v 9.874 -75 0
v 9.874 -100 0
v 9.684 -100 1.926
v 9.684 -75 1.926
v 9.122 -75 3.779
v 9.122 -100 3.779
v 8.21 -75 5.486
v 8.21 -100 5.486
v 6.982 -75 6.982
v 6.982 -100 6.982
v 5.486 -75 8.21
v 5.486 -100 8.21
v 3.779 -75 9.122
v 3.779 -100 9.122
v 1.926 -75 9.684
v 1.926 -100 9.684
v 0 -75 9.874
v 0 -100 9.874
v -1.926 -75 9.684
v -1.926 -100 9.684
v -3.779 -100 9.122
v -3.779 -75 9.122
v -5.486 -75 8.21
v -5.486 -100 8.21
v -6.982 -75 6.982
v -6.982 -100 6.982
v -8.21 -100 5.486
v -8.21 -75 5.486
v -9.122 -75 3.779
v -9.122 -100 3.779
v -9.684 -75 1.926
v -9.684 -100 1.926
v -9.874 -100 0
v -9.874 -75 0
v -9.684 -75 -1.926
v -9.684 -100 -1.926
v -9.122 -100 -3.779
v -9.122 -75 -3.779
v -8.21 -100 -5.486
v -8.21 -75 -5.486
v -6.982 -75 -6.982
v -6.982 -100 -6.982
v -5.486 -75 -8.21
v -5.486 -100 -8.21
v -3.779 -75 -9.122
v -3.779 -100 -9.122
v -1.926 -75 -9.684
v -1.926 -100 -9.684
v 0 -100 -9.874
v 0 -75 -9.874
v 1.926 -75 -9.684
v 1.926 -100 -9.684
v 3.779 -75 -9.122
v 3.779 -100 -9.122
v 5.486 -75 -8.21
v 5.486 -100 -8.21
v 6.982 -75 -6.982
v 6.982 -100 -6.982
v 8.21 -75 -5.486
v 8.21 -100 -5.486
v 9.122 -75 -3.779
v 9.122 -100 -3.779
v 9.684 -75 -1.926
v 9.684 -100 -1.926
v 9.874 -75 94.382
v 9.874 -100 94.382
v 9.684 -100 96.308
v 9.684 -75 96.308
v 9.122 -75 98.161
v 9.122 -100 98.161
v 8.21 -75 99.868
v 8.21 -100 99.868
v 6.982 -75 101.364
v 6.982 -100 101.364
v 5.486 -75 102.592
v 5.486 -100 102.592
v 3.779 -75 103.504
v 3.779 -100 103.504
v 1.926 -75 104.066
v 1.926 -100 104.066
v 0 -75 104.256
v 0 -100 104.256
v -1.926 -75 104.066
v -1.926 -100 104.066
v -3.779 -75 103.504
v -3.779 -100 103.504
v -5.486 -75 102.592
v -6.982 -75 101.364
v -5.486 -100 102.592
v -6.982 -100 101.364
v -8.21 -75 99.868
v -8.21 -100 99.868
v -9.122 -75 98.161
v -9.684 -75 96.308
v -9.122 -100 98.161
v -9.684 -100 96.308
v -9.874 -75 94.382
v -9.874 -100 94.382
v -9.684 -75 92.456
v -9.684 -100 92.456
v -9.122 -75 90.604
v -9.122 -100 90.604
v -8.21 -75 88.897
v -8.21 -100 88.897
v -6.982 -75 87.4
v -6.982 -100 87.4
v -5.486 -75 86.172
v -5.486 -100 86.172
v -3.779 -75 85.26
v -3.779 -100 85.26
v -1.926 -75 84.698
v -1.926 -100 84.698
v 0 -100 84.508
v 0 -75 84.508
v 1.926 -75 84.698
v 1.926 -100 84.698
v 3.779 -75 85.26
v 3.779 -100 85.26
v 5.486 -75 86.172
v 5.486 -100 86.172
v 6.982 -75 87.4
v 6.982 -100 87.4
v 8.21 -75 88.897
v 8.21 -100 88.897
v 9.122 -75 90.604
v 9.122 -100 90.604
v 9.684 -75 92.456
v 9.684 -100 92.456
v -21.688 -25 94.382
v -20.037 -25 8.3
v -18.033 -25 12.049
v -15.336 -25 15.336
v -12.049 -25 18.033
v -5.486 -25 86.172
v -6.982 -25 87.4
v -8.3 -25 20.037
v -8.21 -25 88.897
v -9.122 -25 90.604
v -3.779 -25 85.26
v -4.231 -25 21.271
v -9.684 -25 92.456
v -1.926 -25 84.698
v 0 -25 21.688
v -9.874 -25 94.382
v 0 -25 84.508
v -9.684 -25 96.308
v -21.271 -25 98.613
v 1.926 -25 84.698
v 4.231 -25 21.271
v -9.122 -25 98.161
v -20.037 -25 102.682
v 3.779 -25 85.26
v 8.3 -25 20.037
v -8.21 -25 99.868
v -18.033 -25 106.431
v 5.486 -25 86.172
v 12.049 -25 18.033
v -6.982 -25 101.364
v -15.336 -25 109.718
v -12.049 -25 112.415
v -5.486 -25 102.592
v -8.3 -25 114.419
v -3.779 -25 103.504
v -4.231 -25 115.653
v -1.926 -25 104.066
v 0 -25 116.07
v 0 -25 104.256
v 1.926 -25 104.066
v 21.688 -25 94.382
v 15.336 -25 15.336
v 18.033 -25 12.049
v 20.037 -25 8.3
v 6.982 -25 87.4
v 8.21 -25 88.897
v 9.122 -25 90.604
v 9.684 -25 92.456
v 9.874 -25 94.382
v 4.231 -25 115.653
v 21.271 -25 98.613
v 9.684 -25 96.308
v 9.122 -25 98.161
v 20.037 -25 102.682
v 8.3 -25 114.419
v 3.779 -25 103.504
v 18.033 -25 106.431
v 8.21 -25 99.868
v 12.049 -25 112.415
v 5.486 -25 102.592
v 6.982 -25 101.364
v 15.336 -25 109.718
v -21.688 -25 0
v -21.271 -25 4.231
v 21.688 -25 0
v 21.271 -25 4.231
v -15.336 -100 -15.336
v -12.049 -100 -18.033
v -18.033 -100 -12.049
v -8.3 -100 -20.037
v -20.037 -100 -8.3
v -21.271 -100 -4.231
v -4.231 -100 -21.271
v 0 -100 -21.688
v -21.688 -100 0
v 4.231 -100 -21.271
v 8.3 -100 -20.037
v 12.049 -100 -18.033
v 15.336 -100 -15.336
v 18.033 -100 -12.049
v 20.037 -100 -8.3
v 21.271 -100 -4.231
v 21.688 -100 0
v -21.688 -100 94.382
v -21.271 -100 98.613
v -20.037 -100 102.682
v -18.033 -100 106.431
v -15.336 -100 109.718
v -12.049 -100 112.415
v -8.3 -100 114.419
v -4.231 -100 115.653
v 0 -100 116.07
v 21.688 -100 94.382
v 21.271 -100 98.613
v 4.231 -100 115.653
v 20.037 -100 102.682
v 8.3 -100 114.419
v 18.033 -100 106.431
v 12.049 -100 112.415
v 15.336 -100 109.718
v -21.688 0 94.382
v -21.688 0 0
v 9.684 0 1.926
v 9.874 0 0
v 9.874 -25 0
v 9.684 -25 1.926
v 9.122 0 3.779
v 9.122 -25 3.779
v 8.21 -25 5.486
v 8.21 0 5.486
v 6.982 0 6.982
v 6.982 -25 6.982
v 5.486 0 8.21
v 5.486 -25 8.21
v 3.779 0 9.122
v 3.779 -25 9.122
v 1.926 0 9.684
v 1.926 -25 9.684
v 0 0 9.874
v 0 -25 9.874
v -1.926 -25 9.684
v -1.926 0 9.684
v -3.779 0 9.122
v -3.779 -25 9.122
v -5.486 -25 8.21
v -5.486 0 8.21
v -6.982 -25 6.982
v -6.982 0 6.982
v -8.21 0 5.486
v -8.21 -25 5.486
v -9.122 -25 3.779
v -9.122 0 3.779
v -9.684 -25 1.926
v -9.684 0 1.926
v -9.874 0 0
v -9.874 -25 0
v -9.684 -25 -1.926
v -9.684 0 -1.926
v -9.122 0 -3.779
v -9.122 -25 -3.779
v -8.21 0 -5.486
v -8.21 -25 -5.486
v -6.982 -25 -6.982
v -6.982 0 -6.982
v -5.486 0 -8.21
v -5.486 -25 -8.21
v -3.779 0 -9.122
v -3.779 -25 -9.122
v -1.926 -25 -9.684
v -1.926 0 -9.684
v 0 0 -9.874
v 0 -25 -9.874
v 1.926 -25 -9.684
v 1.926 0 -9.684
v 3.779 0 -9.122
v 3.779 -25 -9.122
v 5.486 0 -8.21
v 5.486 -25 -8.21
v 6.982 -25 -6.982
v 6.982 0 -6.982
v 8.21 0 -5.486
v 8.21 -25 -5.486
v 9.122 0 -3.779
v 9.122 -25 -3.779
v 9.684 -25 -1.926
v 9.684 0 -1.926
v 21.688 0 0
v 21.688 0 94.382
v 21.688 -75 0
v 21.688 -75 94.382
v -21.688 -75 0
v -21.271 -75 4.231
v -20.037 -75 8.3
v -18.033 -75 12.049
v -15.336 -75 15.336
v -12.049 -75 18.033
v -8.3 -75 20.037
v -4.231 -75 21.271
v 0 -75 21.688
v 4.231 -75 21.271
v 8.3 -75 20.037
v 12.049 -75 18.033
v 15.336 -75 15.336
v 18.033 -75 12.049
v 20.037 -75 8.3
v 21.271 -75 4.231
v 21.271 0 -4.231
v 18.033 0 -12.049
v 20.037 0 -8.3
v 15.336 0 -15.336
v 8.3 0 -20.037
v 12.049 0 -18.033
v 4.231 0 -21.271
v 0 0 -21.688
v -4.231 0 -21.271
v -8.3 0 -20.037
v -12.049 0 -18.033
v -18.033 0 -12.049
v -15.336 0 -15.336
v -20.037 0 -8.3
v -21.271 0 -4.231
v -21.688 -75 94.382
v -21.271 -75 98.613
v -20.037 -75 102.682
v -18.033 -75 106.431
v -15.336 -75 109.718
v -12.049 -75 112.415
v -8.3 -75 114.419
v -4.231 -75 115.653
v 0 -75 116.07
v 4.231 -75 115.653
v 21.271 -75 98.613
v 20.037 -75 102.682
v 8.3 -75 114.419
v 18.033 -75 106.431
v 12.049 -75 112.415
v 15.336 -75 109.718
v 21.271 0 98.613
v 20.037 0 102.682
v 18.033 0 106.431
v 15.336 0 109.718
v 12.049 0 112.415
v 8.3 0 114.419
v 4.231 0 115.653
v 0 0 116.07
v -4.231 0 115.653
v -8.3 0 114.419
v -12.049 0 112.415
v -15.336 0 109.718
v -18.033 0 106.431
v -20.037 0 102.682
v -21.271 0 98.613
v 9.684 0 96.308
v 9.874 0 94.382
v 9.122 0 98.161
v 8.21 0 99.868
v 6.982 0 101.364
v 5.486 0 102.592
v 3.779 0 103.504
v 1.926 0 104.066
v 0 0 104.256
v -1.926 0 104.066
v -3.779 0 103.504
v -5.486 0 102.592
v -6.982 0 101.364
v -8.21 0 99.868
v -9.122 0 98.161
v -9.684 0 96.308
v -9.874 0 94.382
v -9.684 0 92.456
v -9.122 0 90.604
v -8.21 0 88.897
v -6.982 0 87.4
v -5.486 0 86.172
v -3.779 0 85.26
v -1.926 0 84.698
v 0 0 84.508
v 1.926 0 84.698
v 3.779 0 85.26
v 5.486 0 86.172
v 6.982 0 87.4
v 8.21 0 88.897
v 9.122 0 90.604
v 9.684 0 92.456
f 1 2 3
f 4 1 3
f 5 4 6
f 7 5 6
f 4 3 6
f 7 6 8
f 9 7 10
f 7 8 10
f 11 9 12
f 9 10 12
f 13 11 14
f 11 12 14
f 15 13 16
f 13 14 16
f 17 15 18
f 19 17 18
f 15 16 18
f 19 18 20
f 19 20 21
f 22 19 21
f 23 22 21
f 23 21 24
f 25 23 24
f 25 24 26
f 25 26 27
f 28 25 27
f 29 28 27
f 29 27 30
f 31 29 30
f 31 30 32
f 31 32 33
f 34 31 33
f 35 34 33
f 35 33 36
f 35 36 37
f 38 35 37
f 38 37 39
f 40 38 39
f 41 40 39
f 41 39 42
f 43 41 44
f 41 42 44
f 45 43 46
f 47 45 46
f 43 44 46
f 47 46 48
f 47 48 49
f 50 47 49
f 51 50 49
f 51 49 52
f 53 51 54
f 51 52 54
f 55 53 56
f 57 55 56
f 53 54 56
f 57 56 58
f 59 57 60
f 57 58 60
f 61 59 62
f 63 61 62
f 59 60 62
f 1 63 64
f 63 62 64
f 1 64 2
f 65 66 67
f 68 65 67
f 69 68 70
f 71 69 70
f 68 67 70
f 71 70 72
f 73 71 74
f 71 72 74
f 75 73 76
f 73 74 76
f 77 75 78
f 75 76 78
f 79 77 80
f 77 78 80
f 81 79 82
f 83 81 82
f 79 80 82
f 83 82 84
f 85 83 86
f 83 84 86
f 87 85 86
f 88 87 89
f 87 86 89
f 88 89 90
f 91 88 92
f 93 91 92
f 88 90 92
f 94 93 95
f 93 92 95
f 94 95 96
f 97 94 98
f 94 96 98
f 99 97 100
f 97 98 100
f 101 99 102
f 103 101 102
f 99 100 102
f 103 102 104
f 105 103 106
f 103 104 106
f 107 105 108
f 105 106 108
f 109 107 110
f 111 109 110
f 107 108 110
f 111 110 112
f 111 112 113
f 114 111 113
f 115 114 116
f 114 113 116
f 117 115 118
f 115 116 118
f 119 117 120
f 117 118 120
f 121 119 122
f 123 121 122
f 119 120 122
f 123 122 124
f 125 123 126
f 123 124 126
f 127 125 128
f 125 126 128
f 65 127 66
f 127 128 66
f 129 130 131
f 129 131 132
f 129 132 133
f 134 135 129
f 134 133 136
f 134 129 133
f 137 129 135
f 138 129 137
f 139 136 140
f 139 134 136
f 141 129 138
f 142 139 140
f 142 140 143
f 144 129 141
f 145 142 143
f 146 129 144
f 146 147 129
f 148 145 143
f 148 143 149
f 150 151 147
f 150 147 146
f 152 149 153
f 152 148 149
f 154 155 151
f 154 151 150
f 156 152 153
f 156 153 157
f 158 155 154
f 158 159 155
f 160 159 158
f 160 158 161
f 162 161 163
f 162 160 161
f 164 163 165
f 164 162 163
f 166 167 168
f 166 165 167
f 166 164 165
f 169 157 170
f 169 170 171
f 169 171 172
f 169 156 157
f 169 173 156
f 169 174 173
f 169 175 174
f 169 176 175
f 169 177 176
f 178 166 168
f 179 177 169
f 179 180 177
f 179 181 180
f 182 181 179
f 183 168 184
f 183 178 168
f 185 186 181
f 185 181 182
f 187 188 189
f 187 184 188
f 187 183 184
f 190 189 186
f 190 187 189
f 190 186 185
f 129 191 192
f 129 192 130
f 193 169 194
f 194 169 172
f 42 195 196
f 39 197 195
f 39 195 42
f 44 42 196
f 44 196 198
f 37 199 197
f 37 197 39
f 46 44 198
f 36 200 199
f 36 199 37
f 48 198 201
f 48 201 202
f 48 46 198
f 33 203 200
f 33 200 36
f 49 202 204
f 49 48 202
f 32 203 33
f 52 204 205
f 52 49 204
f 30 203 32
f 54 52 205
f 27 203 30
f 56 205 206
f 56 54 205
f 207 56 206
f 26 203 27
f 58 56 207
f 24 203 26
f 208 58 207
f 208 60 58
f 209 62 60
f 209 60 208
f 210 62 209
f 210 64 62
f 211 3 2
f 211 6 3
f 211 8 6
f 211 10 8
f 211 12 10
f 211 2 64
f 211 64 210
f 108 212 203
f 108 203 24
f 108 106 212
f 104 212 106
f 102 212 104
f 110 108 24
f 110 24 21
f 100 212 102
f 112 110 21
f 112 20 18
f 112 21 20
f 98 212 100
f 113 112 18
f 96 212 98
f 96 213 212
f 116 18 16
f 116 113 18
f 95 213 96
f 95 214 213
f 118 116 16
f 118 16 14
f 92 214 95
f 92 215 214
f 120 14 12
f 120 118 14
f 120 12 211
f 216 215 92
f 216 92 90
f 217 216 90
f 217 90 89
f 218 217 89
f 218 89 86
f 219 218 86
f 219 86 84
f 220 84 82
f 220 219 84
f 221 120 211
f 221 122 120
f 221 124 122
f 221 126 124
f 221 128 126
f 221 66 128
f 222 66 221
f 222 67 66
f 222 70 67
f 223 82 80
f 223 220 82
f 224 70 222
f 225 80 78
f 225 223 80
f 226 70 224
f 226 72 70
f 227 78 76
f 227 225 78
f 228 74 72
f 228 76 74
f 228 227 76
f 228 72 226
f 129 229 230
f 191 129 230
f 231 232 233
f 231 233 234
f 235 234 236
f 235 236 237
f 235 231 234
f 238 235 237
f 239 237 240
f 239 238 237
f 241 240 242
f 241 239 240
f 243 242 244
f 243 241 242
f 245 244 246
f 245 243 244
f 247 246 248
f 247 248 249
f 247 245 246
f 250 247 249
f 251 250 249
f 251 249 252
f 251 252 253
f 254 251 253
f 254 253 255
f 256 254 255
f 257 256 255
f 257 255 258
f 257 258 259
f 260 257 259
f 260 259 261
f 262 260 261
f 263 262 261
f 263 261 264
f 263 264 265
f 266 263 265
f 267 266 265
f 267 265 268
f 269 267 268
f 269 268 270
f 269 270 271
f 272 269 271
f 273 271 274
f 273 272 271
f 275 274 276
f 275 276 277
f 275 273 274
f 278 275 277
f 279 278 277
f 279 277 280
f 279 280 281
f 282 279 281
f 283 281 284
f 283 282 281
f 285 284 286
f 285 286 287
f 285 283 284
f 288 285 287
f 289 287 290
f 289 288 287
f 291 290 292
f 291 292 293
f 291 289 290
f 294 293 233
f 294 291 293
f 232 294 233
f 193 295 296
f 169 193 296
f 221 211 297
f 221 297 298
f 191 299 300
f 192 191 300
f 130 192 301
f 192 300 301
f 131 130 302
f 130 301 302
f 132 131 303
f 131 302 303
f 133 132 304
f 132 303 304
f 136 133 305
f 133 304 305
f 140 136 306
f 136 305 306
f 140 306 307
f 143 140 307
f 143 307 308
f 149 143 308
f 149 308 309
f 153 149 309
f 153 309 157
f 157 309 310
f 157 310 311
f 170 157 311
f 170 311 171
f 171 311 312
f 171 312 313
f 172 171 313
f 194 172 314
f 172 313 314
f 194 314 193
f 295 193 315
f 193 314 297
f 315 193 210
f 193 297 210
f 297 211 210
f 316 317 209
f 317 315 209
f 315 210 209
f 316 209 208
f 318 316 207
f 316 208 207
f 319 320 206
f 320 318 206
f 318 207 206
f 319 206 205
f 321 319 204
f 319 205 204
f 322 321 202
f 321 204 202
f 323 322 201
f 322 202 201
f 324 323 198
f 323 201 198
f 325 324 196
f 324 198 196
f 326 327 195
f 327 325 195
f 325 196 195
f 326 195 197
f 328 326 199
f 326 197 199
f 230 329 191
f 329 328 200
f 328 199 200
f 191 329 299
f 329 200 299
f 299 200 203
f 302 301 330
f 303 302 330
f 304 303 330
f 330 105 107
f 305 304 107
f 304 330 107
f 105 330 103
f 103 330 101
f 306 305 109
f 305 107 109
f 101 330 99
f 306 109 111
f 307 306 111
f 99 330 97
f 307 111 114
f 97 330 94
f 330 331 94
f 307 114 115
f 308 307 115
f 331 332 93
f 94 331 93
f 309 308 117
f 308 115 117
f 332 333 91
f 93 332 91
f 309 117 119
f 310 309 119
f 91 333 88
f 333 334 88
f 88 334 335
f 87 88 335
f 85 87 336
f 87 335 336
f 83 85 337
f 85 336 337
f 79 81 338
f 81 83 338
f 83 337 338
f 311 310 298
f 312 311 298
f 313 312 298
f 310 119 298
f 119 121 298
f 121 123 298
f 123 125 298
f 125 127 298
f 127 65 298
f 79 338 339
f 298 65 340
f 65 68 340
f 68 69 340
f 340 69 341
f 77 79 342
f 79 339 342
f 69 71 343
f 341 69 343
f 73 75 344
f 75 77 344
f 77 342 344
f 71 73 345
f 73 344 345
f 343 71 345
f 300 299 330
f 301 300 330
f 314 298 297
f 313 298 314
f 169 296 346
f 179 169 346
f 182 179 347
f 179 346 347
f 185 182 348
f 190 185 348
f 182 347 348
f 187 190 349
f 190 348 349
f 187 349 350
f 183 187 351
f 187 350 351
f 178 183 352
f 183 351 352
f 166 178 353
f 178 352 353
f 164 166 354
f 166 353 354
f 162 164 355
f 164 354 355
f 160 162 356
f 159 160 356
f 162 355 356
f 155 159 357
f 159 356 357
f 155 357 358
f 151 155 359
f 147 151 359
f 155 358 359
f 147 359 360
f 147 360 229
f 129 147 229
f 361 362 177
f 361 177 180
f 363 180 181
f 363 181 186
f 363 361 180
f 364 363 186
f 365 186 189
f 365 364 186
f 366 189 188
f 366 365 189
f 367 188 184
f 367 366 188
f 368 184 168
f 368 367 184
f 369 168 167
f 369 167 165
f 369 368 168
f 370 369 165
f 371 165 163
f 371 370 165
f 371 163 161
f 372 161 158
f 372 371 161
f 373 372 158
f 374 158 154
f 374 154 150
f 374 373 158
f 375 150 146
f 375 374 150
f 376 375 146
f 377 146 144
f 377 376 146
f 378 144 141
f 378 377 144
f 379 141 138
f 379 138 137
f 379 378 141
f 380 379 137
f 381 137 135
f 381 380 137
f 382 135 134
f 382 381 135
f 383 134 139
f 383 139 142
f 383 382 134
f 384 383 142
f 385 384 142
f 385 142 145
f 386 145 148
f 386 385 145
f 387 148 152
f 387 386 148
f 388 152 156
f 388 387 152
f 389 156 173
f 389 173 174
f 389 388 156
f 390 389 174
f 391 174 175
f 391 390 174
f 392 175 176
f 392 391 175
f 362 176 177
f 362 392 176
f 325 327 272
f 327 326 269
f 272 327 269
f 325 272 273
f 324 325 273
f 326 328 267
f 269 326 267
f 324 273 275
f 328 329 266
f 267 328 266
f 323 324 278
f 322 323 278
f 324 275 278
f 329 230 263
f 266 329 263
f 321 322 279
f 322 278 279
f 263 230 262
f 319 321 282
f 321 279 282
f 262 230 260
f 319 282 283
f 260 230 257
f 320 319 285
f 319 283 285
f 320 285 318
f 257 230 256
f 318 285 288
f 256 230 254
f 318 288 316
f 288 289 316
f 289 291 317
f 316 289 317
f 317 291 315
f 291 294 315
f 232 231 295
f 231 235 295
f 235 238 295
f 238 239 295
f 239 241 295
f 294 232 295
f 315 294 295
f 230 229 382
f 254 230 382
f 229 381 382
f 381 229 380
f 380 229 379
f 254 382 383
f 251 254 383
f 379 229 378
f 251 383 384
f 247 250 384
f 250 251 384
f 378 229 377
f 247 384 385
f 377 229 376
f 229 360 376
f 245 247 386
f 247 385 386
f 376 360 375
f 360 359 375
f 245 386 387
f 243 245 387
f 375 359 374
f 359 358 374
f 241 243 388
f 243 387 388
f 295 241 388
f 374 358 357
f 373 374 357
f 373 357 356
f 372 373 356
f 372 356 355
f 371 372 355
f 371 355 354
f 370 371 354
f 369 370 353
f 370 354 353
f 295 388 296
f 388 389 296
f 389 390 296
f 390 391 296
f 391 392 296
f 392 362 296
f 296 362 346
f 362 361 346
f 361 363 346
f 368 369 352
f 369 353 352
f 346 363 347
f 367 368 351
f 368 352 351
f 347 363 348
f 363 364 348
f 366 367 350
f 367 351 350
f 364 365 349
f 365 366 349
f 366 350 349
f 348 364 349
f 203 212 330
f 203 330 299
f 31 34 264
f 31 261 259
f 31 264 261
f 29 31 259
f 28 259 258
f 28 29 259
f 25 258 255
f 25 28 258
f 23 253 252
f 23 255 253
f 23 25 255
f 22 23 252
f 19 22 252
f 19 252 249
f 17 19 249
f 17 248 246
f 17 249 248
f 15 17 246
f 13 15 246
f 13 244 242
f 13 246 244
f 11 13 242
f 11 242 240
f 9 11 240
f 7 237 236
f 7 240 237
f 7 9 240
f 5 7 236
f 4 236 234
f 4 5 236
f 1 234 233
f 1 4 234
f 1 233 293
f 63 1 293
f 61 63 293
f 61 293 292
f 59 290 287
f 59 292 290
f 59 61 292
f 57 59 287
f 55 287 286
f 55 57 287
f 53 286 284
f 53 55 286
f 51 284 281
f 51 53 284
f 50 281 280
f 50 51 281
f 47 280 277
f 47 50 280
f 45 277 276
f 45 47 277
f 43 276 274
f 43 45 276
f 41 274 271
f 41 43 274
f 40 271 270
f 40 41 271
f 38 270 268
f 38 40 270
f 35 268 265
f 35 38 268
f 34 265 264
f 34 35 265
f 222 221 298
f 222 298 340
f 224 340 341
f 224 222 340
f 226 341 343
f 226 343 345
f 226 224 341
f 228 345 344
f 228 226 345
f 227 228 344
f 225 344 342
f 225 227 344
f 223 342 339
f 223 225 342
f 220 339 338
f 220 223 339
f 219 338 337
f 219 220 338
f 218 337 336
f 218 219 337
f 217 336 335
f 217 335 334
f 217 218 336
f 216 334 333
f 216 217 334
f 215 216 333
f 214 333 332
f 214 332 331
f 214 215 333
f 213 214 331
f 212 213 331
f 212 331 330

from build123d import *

# Parameters (mm, degrees)
F0_R     = 9.8737284495
F1_DEPTH = 25
F4_R     = 9.8737284495
F5_DEPTH = 50


with BuildPart() as f1:
    # F0 (on Front) → F1 (new body)
    with BuildSketch(Plane.XZ):
        with BuildLine():
            Line((-21.6877176851, 94.382122159), (-21.6877176851, 0))
            ThreePointArc((-21.6877176851, 0), (0, -21.6877176851), (21.6877176851, 0))
            Line((21.6877176851, 0), (21.6877176851, 94.382122159))
            ThreePointArc((21.6877176851, 94.382122159), (0, 116.0698398441), (-21.6877176851, 94.382122159))
        make_face()
        Circle(F0_R, mode=Mode.SUBTRACT)
        with Locations((0, 94.382122159)):
            Circle(F0_R, mode=Mode.SUBTRACT)
    extrude(amount=F1_DEPTH)


with BuildPart() as f3_1:
    # F3: instance of F1
    add(f1.part.mirror(Plane.XZ.offset(50)))


with BuildPart() as f1_1:
    add(f1.part)

    add(f3_1.part)  # F5 merges F3_1
    # F4 (on face) → F5 (join, through all)
    with BuildSketch(Plane(origin=(0, -75, 0), x_dir=(-1, 0, 0), z_dir=(0, 1, 0))):
        with BuildLine():
            ThreePointArc((-21.6877176851, 0), (0, -21.6877176851), (21.6877176851, 0))
            ThreePointArc((21.6877176851, 0), (0, 21.6877176851), (-21.6877176851, 0))
        make_face()
        Circle(F4_R, mode=Mode.SUBTRACT)
    extrude(amount=F5_DEPTH)


solid = f1_1.part
